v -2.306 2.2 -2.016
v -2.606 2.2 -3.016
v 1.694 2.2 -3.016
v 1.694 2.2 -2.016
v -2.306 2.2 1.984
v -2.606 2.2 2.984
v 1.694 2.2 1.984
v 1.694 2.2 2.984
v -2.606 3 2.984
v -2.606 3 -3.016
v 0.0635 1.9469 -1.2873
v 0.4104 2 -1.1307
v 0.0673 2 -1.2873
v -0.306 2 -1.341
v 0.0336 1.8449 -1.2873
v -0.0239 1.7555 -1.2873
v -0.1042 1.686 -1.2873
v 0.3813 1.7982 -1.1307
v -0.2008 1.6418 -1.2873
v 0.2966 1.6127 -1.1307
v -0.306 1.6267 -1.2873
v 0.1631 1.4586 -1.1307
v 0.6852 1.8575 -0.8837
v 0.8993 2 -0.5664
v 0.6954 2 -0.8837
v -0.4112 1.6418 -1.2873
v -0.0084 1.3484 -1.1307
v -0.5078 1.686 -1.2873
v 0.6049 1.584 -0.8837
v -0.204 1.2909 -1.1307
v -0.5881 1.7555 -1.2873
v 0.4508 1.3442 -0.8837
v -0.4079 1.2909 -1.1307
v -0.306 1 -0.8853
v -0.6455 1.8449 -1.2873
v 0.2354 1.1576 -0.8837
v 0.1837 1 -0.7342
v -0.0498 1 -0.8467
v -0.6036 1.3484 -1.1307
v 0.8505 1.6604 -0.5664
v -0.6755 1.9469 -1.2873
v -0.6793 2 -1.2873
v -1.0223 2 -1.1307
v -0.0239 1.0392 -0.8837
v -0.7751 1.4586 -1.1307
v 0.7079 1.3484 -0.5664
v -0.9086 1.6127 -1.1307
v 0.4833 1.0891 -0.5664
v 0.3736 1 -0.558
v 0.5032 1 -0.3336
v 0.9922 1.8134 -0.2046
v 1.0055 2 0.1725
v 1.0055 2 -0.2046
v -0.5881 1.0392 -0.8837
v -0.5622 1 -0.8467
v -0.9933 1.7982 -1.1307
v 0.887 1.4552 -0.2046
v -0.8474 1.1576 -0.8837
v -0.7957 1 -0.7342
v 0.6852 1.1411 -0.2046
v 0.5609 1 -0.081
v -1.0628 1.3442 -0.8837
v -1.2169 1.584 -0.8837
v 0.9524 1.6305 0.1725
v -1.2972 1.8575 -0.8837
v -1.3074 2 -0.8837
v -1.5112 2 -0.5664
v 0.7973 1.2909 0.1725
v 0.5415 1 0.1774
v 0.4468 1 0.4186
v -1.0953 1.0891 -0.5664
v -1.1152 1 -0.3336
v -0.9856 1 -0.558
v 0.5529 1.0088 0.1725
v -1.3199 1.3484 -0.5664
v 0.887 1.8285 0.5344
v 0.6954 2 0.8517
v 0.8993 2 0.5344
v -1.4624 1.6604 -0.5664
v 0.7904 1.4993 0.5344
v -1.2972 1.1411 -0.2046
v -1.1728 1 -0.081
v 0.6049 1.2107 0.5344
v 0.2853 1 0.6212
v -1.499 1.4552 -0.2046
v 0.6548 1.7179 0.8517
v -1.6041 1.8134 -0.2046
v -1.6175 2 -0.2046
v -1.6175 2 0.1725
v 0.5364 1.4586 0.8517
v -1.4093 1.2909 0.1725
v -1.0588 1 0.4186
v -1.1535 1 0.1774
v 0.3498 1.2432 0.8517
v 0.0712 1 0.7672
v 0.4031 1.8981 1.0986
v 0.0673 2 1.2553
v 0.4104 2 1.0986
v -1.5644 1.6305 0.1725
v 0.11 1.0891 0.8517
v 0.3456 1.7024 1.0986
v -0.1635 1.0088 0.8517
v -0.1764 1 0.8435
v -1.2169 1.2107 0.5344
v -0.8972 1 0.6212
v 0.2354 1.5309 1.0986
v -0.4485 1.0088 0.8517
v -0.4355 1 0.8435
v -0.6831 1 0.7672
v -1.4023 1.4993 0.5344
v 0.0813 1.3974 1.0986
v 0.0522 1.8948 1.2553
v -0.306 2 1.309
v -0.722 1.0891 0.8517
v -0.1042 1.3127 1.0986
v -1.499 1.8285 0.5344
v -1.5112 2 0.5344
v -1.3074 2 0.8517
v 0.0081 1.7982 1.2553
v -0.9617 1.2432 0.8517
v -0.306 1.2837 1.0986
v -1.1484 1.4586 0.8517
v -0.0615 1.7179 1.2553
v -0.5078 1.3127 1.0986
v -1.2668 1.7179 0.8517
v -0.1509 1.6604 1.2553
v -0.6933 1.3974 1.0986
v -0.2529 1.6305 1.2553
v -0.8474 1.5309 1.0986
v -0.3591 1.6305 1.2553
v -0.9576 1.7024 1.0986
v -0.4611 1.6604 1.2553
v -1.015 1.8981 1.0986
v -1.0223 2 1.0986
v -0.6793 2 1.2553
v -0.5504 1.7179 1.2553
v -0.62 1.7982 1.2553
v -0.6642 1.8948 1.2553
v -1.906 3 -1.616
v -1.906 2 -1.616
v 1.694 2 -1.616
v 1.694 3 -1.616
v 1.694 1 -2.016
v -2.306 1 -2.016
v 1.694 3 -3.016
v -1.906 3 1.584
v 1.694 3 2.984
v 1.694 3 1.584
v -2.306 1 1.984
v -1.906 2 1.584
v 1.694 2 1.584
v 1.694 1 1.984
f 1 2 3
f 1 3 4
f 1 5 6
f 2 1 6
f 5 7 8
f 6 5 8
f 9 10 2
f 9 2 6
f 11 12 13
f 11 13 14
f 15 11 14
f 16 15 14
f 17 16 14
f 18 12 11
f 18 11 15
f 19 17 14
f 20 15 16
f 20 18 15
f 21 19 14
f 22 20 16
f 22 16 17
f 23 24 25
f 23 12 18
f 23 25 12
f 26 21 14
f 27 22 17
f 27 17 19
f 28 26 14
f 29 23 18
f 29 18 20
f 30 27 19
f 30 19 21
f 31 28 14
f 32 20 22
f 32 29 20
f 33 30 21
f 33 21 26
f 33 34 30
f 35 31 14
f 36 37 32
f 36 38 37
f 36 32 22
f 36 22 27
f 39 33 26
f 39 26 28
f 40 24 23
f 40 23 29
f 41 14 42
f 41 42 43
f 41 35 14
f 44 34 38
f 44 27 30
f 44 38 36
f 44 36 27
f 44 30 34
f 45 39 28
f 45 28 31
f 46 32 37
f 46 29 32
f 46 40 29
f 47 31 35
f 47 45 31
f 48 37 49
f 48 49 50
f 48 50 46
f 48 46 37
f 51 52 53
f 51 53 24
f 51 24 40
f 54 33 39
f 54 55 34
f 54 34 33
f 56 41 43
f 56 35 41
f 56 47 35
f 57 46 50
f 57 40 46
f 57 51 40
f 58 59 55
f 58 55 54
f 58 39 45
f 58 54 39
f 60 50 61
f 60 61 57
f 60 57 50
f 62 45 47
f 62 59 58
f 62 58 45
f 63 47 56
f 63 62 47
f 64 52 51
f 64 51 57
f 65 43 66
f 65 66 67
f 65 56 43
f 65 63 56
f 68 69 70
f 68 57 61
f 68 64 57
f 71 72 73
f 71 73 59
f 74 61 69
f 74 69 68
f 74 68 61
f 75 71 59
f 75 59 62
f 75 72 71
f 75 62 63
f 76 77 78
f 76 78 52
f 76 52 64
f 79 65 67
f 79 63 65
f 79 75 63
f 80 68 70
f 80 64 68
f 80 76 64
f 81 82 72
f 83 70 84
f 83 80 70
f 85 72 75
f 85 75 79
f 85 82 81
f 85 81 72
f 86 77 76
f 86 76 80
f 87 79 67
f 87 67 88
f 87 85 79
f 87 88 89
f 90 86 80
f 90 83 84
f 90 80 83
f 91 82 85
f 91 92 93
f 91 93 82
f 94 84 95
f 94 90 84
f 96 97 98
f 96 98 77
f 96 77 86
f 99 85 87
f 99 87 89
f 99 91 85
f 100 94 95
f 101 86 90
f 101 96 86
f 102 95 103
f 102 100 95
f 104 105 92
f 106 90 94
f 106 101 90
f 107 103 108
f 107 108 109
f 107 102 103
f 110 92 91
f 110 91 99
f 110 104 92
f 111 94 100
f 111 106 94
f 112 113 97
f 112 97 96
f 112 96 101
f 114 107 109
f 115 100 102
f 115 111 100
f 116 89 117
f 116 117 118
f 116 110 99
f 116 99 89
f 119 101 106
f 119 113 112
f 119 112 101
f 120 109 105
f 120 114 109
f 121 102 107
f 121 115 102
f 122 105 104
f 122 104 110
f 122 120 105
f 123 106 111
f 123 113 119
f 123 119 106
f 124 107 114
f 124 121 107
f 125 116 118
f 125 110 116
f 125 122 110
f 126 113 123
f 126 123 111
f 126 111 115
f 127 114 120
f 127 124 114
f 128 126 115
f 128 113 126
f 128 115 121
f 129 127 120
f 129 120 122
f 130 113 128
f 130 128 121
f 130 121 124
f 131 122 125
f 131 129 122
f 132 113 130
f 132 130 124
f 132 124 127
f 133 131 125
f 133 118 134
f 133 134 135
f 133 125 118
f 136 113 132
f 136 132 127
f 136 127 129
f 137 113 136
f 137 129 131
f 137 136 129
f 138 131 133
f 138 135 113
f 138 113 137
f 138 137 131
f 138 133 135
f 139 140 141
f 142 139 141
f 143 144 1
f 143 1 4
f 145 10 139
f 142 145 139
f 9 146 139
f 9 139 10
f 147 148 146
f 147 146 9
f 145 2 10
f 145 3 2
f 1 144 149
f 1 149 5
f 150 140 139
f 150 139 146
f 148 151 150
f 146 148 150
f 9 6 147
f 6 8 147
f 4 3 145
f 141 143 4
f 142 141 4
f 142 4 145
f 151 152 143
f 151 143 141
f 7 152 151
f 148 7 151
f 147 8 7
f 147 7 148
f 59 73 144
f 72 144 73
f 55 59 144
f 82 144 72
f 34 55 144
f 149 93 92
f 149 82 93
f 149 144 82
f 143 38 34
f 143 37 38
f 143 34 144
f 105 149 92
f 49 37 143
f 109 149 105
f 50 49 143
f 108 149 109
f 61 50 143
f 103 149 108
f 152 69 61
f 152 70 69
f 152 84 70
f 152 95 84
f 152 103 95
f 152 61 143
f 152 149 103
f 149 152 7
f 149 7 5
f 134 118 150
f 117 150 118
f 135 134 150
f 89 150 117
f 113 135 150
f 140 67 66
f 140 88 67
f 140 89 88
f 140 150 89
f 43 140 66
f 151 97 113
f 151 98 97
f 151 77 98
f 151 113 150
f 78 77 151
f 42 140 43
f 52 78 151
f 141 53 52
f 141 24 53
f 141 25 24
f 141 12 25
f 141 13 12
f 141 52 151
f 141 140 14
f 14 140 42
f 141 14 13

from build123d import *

# Parameters (mm, degrees)
SKETCH1_W           = 4
SKETCH1_H           = 4
BOSS_EXTRUDE1_DEPTH = 2
SKETCH3_W           = 6.995739113
SKETCH3_H           = 4.795831112
CUT_EXTRUDE1_DEPTH  = 1
BOSS_EXTRUDE2_DEPTH = 1
SKETCH5_W           = 4
SKETCH5_H           = 0.8
BOSS_EXTRUDE3_DEPTH = 1
SKETCH6_W           = 4
SKETCH6_H           = 0.8
BOSS_EXTRUDE4_DEPTH = 1
SKETCH9_W           = 6
SKETCH9_H           = 0.8
BOSS_EXTRUDE6_DEPTH = 0.3


with BuildPart() as part:
    # Sketch1 → Boss-Extrude1 (new body)
    with BuildSketch(Plane(origin=(0, 0, 0), x_dir=(1, 0, 0), z_dir=(0, 1, 0))):
        with Locations((-0.305984445, 0.016020496)):
            Rectangle(SKETCH1_W, SKETCH1_H)
    extrude(amount=BOSS_EXTRUDE1_DEPTH)

    # Sketch2 → Cut-Revolve1 (revolve, cut)
    with BuildSketch(Plane(origin=(0, 2, 0), x_dir=(1, 0, 0), z_dir=(0, 1, 0))):
        with BuildLine():
            Line((-0.305984445, -1.308979504), (-0.305984445, 1.341020496))
            ThreePointArc((-0.305984445, 1.341020496), (-1.630984445, 0.016020496), (-0.305984445, -1.308979504))
        make_face()
    revolve(axis=Axis((-0.305984445, 2, 1.308979504), (0, 0, -1)), mode=Mode.SUBTRACT)

    # Sketch3 → Cut-Extrude1 (cut)
    with BuildSketch(Plane.XZ):
        with Locations((-1.219435612, 0.226207457)):
            Rectangle(SKETCH3_W, SKETCH3_H)
    extrude(amount=-CUT_EXTRUDE1_DEPTH, mode=Mode.SUBTRACT)

    # Sketch4 → Boss-Extrude2 (add)
    with BuildSketch(Plane(origin=(0, 2, 0), x_dir=(1, 0, 0), z_dir=(0, 1, 0))):
        Polygon((-1.905984445, -1.583979504), (1.515020657, -1.583979504), (1.694015555, -1.583979504), (1.694015555, -1.983979504), (-2.305984445, -1.983979504), (-2.305984445, 2.016020496), (1.694015555, 2.016020496), (1.694015555, 1.616020496), (1.515020657, 1.616020496), (-1.905984445, 1.616020496), align=None)
    extrude(amount=BOSS_EXTRUDE2_DEPTH)

    # Sketch5 → Boss-Extrude3 (add)
    with BuildSketch(Plane.XY.offset(1.983979504)):
        with Locations((-0.305984445, 2.6)):
            Rectangle(SKETCH5_W, SKETCH5_H)
    extrude(amount=BOSS_EXTRUDE3_DEPTH)

    # Sketch6 → Boss-Extrude4 (add)
    with BuildSketch(Plane(origin=(0, 0, -2.016020496), x_dir=(-1, 0, 0), z_dir=(0, 0, -1))):
        with Locations((0.305984445, 2.6)):
            Rectangle(SKETCH6_W, SKETCH6_H)
    extrude(amount=BOSS_EXTRUDE4_DEPTH)

    # Sketch9 → Boss-Extrude6 (add)
    with BuildSketch(Plane.ZY.offset(2.305984445)):
        with Locations((-0.016020496, 2.6)):
            Rectangle(SKETCH9_W, SKETCH9_H)
    extrude(amount=BOSS_EXTRUDE6_DEPTH)


solid = part.part
